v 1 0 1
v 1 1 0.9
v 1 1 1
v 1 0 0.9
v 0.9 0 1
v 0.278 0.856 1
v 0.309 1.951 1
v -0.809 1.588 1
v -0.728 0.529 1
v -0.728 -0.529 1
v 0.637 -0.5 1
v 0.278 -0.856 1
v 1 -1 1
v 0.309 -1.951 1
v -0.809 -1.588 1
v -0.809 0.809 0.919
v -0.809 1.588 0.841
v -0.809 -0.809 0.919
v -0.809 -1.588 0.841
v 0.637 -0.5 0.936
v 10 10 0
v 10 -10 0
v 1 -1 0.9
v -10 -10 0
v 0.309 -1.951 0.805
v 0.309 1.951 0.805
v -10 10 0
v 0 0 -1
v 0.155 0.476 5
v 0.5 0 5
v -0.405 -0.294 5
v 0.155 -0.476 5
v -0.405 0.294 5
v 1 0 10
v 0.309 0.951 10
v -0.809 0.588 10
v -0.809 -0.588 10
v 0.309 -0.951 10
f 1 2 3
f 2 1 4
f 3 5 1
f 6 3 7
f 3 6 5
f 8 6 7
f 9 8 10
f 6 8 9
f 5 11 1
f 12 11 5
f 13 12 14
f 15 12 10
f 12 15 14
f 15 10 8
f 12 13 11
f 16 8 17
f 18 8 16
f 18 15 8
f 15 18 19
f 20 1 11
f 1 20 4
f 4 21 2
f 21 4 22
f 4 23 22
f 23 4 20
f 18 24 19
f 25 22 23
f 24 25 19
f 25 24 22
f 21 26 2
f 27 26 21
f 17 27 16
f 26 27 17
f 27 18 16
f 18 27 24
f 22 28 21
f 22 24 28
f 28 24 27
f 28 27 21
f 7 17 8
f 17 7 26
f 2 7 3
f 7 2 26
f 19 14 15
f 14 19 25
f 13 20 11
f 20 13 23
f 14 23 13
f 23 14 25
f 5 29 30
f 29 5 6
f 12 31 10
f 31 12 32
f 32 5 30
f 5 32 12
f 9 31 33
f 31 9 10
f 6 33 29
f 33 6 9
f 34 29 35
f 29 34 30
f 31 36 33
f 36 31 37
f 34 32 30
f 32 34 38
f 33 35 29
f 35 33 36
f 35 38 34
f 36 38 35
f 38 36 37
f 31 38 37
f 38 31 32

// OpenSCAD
inf = 1/0;
nan = inf / inf;
tests= [1,0,-1,-inf,nan,inf,"test"];
echo("Primitives");
for(i=tests){
    echo(str("i=",i,", primitive test"));

    cube([1,i,1]);
    sphere(i);
    cylinder(h=i);
    cylinder(r=i);
    square(i);
    square([1,i]);
    square([i,1]);
    circle(i);
    polyhedron(
      points=[ [10,10,0],[10,-10,0],[-10,-10,0],[-10,10,0], // the four points at base
               [0,0,i]  ],                                 // the apex point 
      faces=[ [0,1,4],[1,2,4],[2,3,4],[3,0,4],              // each triangle side
                  [1,0,3],[2,1,3] ]                         // two triangles for square base
     );
}
echo("Transformations");
for(i=tests){
    echo(str("i=",i,", transformation test"));
    scale(i)
    sphere();
    rotate(i);
    cube();
    translate([0,i,0])
    cylinder();
}
echo("Those are okay");
cylinder(r1=1,r2=0,h=10);
cylinder(r1=0,r2=1,h=10);

echo("cylinder with only r1 or r2 out of range");
cylinder(h=1, r1=-1);
cylinder(h=1, r2=-1);
cylinder(h=1, d2=-2);

echo("cylinder with both r/d and r1/r2/d1/d2 specified");
cylinder(r=1, r1=1);    // Check that it recognizes r+r1 as invalid, and reports r/r1.
cylinder(r=1, r2=1);    // Check that it recognizez r+r2 as invalid, and reports r2.
cylinder(d=1, d1=1);    // Check that it reports d/d1.
// It seems safe to assume that that covers all eight cases {r,d}, {r1,r2,d1,d2}.
